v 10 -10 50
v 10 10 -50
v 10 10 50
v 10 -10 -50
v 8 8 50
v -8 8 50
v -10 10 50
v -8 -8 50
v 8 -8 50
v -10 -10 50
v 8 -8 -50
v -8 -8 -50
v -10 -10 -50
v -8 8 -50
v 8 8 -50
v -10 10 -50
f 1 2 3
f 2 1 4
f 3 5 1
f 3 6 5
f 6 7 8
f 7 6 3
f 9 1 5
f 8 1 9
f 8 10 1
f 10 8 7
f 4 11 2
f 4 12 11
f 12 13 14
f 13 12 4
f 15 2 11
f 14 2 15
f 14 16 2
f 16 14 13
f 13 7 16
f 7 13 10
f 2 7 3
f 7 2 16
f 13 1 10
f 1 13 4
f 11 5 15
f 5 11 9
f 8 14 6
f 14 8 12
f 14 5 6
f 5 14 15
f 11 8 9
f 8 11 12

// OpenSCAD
// Aluminium rectangular box section 20mm x 20mm x 2mm

outer_w = 20;
outer_h = 20;
t       = 2;
len     = 100;

centered = true;     // true = centered on Z, false = sits on Z=0
eps = 0.2;           // small extension to avoid coincident faces

inner_w = outer_w - 2*t;
inner_h = outer_h - 2*t;

module box_section_rect(ow, oh, wall, L, e=0.2, ctr=true) {
    iw = ow - 2*wall;
    ih = oh - 2*wall;

    // Guard against invalid dimensions
    assert(iw > 0 && ih > 0, "Wall thickness too large for given outer dimensions.");

    difference() {
        cube([ow, oh, L], center=ctr);
        // Inner void extended slightly beyond ends for a clean through-hole
        cube([iw, ih, L + 2*e], center=ctr);
    }
}

translate([0, 0, centered ? 0 : len/2])
    box_section_rect(outer_w, outer_h, t, len, eps, true);
